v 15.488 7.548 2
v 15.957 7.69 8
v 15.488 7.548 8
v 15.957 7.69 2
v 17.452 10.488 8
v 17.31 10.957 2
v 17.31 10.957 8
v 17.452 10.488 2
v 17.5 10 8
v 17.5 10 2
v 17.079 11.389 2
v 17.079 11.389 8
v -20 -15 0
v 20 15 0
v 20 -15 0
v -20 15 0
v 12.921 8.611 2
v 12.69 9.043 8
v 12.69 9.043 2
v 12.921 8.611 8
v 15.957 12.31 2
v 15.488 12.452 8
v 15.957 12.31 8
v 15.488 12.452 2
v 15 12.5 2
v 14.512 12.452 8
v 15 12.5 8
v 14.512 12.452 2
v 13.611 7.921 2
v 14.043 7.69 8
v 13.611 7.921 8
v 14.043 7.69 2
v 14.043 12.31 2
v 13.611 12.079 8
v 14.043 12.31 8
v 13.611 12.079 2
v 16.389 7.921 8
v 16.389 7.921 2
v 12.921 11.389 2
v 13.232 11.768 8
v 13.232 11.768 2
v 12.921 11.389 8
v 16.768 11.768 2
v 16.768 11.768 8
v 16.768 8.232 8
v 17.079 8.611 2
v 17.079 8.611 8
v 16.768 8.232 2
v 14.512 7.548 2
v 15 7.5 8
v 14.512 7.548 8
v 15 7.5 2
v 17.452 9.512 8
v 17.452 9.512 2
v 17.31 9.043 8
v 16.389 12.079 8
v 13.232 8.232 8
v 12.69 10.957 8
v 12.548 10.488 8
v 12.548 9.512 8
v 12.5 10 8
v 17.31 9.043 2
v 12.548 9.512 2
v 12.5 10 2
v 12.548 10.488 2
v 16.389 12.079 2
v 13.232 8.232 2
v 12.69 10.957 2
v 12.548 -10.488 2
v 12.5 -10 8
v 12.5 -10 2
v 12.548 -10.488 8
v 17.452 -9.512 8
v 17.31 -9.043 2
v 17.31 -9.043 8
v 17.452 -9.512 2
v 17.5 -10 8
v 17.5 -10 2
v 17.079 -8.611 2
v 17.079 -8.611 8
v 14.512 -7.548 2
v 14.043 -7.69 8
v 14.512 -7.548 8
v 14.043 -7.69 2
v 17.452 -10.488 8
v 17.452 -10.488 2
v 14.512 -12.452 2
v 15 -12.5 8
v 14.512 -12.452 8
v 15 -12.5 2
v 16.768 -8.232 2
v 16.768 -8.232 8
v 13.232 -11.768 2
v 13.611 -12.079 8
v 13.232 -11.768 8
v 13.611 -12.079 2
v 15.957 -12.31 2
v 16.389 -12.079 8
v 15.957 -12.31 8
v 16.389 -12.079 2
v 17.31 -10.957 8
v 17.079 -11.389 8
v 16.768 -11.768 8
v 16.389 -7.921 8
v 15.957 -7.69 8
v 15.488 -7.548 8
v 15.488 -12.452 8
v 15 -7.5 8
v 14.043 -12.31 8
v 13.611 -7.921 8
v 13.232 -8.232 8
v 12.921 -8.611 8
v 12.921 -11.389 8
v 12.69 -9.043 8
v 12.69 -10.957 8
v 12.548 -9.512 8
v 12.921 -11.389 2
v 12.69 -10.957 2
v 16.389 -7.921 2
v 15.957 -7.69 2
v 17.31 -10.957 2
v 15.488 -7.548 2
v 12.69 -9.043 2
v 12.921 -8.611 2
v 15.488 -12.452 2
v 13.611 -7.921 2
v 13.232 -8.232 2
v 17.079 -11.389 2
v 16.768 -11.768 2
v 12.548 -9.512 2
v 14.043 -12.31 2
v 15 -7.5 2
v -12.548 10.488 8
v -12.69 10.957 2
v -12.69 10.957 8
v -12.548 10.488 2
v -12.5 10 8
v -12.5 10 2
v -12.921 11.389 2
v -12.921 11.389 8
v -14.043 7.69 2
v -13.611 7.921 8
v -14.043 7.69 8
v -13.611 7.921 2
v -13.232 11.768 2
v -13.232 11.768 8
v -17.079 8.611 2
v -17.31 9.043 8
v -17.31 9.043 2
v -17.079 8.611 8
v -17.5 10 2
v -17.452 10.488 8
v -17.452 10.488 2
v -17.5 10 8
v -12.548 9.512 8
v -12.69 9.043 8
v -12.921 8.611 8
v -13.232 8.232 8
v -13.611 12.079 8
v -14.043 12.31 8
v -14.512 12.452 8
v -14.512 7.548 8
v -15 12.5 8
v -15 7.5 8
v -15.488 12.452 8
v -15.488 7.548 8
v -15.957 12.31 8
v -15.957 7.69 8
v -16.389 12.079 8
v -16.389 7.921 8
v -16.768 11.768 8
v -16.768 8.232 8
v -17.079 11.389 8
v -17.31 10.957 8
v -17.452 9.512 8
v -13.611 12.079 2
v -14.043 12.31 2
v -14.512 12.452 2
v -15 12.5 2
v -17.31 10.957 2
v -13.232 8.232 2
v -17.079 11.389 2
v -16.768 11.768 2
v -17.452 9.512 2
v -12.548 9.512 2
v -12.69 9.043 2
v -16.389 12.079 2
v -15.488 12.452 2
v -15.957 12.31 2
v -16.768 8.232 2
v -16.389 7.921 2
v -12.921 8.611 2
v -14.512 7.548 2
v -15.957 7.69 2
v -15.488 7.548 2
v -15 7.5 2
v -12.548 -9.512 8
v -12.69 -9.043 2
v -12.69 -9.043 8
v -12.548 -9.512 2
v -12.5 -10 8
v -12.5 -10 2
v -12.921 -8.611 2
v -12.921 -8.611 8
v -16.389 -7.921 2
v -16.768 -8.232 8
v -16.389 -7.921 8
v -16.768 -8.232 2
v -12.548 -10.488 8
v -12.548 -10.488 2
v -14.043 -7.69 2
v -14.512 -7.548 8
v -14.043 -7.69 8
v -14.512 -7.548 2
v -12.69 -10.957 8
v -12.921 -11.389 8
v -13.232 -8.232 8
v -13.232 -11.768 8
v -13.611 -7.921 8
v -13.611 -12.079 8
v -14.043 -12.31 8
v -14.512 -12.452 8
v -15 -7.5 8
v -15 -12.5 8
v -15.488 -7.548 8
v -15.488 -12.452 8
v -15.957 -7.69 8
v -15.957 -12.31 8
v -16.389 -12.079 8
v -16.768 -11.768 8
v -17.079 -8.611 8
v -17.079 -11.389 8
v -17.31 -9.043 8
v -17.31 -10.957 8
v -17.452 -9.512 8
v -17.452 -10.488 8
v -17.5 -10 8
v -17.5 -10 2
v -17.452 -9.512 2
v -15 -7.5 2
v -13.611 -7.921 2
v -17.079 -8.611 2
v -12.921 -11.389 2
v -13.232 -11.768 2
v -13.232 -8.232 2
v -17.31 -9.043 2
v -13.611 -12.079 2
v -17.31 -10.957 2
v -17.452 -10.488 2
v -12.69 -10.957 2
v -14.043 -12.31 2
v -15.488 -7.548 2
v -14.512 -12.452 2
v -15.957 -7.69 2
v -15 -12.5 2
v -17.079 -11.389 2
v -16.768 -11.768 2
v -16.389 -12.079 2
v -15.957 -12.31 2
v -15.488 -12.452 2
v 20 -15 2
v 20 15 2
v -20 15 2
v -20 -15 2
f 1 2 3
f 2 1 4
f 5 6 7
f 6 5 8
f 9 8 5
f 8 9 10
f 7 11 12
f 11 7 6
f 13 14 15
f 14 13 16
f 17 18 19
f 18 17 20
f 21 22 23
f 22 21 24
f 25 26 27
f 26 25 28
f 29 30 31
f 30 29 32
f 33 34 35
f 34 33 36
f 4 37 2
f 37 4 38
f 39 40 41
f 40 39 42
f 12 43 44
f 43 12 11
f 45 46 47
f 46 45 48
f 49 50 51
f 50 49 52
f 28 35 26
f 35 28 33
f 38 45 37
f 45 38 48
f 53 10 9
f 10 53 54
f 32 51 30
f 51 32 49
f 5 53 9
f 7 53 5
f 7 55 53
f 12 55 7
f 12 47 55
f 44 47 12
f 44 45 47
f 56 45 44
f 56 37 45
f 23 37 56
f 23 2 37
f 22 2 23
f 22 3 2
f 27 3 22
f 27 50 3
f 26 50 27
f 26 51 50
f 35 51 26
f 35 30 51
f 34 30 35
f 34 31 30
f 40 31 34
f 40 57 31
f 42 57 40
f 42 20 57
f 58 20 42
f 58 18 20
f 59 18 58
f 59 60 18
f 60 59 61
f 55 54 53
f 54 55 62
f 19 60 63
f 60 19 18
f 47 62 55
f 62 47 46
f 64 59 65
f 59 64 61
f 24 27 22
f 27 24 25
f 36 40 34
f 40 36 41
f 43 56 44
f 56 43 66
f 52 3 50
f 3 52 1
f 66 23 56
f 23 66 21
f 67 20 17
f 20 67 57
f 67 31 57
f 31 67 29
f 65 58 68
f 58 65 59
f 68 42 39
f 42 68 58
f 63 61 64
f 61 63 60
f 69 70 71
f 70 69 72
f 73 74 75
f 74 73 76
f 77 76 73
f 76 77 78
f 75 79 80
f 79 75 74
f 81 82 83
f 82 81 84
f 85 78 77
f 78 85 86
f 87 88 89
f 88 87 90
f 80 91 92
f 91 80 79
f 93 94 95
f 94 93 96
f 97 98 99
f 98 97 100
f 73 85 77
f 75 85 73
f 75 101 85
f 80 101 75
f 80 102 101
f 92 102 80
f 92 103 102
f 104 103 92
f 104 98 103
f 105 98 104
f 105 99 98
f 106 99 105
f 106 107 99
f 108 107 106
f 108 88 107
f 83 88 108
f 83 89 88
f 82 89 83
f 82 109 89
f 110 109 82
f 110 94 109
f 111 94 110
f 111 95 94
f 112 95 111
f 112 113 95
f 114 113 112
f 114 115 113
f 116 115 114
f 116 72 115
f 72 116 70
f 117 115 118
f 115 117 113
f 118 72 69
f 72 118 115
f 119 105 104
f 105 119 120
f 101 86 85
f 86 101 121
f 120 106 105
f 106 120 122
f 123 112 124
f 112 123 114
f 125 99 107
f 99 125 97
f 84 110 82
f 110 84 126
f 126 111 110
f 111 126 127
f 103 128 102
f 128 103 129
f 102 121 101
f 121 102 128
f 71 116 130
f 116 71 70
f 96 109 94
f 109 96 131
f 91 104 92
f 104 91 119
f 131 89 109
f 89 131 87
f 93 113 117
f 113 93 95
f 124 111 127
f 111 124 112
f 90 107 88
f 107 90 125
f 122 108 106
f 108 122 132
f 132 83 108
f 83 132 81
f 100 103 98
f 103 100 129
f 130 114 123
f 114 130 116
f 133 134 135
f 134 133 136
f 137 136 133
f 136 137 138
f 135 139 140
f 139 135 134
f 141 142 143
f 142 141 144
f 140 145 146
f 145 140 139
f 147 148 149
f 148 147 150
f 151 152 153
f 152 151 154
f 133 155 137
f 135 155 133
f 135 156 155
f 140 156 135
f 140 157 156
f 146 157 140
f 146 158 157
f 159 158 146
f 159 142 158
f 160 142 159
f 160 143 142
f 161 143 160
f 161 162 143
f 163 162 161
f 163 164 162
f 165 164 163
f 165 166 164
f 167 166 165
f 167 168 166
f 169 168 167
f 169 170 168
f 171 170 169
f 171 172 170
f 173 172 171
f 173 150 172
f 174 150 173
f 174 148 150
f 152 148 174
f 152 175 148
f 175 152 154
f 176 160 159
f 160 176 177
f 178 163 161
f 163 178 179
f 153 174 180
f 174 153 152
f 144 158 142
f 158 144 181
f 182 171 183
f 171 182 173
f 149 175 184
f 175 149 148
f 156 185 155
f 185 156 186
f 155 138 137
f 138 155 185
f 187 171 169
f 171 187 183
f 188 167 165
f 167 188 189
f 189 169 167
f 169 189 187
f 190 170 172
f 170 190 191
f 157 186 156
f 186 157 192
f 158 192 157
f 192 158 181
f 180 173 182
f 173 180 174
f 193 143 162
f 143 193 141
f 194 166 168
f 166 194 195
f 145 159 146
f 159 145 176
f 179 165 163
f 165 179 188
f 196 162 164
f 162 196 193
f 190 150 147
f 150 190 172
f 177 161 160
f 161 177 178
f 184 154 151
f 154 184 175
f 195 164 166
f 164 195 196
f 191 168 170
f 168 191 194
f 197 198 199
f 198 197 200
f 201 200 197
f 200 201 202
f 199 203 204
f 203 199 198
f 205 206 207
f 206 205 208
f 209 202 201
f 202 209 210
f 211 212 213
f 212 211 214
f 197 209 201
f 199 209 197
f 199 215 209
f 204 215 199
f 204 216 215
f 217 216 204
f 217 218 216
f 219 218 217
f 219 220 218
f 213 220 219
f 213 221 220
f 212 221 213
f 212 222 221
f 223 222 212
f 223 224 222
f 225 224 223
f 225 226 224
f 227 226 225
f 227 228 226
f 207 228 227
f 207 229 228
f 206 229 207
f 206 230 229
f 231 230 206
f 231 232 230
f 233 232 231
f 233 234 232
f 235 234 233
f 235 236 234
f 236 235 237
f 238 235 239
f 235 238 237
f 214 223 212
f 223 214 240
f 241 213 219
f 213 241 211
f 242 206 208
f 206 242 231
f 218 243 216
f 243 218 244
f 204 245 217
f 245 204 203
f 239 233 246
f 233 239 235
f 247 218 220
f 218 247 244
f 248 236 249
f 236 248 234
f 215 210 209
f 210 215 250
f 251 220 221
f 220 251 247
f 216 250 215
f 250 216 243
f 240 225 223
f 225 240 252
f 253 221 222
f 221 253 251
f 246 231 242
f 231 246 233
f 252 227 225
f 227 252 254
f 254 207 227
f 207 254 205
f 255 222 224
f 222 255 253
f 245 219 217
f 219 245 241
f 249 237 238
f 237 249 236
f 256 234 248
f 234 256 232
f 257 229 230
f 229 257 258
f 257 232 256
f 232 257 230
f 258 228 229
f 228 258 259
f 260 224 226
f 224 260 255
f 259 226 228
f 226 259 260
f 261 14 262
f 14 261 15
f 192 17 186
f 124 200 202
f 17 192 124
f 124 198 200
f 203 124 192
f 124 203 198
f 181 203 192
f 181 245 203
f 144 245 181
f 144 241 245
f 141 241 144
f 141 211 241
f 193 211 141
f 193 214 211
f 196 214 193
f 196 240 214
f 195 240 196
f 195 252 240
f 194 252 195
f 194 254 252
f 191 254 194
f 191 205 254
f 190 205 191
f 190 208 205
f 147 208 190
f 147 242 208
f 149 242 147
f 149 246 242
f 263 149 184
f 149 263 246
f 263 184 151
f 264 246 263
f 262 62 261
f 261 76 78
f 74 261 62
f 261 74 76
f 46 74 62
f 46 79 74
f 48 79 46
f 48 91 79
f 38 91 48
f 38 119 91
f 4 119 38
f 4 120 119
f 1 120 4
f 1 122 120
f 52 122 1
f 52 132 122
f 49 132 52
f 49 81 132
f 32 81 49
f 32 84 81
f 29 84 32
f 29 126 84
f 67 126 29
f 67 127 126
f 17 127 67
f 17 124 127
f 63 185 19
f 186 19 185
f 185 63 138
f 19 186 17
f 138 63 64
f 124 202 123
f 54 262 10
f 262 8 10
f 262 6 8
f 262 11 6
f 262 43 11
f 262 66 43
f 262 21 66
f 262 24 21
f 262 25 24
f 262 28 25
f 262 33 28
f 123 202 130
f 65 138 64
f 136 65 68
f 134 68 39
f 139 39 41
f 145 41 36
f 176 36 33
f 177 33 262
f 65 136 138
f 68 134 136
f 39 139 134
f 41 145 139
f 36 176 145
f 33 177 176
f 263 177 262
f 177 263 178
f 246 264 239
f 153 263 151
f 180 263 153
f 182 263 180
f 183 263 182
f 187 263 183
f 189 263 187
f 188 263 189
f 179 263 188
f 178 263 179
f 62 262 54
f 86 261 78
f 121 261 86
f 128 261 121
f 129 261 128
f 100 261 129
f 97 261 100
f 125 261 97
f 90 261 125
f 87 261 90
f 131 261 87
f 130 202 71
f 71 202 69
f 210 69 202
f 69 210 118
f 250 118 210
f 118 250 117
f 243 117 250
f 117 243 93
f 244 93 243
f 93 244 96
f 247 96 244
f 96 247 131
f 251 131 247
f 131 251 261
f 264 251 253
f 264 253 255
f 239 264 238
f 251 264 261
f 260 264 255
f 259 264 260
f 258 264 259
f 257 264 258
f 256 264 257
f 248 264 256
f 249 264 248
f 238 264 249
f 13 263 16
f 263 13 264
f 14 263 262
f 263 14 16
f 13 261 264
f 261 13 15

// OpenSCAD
use <../nscad-lib.scad>

color("lightgray") cubec(40, 30, 2);
color("orange") vier(15, 10) cylinder(d = 5, h = 8, $fn = 32);
